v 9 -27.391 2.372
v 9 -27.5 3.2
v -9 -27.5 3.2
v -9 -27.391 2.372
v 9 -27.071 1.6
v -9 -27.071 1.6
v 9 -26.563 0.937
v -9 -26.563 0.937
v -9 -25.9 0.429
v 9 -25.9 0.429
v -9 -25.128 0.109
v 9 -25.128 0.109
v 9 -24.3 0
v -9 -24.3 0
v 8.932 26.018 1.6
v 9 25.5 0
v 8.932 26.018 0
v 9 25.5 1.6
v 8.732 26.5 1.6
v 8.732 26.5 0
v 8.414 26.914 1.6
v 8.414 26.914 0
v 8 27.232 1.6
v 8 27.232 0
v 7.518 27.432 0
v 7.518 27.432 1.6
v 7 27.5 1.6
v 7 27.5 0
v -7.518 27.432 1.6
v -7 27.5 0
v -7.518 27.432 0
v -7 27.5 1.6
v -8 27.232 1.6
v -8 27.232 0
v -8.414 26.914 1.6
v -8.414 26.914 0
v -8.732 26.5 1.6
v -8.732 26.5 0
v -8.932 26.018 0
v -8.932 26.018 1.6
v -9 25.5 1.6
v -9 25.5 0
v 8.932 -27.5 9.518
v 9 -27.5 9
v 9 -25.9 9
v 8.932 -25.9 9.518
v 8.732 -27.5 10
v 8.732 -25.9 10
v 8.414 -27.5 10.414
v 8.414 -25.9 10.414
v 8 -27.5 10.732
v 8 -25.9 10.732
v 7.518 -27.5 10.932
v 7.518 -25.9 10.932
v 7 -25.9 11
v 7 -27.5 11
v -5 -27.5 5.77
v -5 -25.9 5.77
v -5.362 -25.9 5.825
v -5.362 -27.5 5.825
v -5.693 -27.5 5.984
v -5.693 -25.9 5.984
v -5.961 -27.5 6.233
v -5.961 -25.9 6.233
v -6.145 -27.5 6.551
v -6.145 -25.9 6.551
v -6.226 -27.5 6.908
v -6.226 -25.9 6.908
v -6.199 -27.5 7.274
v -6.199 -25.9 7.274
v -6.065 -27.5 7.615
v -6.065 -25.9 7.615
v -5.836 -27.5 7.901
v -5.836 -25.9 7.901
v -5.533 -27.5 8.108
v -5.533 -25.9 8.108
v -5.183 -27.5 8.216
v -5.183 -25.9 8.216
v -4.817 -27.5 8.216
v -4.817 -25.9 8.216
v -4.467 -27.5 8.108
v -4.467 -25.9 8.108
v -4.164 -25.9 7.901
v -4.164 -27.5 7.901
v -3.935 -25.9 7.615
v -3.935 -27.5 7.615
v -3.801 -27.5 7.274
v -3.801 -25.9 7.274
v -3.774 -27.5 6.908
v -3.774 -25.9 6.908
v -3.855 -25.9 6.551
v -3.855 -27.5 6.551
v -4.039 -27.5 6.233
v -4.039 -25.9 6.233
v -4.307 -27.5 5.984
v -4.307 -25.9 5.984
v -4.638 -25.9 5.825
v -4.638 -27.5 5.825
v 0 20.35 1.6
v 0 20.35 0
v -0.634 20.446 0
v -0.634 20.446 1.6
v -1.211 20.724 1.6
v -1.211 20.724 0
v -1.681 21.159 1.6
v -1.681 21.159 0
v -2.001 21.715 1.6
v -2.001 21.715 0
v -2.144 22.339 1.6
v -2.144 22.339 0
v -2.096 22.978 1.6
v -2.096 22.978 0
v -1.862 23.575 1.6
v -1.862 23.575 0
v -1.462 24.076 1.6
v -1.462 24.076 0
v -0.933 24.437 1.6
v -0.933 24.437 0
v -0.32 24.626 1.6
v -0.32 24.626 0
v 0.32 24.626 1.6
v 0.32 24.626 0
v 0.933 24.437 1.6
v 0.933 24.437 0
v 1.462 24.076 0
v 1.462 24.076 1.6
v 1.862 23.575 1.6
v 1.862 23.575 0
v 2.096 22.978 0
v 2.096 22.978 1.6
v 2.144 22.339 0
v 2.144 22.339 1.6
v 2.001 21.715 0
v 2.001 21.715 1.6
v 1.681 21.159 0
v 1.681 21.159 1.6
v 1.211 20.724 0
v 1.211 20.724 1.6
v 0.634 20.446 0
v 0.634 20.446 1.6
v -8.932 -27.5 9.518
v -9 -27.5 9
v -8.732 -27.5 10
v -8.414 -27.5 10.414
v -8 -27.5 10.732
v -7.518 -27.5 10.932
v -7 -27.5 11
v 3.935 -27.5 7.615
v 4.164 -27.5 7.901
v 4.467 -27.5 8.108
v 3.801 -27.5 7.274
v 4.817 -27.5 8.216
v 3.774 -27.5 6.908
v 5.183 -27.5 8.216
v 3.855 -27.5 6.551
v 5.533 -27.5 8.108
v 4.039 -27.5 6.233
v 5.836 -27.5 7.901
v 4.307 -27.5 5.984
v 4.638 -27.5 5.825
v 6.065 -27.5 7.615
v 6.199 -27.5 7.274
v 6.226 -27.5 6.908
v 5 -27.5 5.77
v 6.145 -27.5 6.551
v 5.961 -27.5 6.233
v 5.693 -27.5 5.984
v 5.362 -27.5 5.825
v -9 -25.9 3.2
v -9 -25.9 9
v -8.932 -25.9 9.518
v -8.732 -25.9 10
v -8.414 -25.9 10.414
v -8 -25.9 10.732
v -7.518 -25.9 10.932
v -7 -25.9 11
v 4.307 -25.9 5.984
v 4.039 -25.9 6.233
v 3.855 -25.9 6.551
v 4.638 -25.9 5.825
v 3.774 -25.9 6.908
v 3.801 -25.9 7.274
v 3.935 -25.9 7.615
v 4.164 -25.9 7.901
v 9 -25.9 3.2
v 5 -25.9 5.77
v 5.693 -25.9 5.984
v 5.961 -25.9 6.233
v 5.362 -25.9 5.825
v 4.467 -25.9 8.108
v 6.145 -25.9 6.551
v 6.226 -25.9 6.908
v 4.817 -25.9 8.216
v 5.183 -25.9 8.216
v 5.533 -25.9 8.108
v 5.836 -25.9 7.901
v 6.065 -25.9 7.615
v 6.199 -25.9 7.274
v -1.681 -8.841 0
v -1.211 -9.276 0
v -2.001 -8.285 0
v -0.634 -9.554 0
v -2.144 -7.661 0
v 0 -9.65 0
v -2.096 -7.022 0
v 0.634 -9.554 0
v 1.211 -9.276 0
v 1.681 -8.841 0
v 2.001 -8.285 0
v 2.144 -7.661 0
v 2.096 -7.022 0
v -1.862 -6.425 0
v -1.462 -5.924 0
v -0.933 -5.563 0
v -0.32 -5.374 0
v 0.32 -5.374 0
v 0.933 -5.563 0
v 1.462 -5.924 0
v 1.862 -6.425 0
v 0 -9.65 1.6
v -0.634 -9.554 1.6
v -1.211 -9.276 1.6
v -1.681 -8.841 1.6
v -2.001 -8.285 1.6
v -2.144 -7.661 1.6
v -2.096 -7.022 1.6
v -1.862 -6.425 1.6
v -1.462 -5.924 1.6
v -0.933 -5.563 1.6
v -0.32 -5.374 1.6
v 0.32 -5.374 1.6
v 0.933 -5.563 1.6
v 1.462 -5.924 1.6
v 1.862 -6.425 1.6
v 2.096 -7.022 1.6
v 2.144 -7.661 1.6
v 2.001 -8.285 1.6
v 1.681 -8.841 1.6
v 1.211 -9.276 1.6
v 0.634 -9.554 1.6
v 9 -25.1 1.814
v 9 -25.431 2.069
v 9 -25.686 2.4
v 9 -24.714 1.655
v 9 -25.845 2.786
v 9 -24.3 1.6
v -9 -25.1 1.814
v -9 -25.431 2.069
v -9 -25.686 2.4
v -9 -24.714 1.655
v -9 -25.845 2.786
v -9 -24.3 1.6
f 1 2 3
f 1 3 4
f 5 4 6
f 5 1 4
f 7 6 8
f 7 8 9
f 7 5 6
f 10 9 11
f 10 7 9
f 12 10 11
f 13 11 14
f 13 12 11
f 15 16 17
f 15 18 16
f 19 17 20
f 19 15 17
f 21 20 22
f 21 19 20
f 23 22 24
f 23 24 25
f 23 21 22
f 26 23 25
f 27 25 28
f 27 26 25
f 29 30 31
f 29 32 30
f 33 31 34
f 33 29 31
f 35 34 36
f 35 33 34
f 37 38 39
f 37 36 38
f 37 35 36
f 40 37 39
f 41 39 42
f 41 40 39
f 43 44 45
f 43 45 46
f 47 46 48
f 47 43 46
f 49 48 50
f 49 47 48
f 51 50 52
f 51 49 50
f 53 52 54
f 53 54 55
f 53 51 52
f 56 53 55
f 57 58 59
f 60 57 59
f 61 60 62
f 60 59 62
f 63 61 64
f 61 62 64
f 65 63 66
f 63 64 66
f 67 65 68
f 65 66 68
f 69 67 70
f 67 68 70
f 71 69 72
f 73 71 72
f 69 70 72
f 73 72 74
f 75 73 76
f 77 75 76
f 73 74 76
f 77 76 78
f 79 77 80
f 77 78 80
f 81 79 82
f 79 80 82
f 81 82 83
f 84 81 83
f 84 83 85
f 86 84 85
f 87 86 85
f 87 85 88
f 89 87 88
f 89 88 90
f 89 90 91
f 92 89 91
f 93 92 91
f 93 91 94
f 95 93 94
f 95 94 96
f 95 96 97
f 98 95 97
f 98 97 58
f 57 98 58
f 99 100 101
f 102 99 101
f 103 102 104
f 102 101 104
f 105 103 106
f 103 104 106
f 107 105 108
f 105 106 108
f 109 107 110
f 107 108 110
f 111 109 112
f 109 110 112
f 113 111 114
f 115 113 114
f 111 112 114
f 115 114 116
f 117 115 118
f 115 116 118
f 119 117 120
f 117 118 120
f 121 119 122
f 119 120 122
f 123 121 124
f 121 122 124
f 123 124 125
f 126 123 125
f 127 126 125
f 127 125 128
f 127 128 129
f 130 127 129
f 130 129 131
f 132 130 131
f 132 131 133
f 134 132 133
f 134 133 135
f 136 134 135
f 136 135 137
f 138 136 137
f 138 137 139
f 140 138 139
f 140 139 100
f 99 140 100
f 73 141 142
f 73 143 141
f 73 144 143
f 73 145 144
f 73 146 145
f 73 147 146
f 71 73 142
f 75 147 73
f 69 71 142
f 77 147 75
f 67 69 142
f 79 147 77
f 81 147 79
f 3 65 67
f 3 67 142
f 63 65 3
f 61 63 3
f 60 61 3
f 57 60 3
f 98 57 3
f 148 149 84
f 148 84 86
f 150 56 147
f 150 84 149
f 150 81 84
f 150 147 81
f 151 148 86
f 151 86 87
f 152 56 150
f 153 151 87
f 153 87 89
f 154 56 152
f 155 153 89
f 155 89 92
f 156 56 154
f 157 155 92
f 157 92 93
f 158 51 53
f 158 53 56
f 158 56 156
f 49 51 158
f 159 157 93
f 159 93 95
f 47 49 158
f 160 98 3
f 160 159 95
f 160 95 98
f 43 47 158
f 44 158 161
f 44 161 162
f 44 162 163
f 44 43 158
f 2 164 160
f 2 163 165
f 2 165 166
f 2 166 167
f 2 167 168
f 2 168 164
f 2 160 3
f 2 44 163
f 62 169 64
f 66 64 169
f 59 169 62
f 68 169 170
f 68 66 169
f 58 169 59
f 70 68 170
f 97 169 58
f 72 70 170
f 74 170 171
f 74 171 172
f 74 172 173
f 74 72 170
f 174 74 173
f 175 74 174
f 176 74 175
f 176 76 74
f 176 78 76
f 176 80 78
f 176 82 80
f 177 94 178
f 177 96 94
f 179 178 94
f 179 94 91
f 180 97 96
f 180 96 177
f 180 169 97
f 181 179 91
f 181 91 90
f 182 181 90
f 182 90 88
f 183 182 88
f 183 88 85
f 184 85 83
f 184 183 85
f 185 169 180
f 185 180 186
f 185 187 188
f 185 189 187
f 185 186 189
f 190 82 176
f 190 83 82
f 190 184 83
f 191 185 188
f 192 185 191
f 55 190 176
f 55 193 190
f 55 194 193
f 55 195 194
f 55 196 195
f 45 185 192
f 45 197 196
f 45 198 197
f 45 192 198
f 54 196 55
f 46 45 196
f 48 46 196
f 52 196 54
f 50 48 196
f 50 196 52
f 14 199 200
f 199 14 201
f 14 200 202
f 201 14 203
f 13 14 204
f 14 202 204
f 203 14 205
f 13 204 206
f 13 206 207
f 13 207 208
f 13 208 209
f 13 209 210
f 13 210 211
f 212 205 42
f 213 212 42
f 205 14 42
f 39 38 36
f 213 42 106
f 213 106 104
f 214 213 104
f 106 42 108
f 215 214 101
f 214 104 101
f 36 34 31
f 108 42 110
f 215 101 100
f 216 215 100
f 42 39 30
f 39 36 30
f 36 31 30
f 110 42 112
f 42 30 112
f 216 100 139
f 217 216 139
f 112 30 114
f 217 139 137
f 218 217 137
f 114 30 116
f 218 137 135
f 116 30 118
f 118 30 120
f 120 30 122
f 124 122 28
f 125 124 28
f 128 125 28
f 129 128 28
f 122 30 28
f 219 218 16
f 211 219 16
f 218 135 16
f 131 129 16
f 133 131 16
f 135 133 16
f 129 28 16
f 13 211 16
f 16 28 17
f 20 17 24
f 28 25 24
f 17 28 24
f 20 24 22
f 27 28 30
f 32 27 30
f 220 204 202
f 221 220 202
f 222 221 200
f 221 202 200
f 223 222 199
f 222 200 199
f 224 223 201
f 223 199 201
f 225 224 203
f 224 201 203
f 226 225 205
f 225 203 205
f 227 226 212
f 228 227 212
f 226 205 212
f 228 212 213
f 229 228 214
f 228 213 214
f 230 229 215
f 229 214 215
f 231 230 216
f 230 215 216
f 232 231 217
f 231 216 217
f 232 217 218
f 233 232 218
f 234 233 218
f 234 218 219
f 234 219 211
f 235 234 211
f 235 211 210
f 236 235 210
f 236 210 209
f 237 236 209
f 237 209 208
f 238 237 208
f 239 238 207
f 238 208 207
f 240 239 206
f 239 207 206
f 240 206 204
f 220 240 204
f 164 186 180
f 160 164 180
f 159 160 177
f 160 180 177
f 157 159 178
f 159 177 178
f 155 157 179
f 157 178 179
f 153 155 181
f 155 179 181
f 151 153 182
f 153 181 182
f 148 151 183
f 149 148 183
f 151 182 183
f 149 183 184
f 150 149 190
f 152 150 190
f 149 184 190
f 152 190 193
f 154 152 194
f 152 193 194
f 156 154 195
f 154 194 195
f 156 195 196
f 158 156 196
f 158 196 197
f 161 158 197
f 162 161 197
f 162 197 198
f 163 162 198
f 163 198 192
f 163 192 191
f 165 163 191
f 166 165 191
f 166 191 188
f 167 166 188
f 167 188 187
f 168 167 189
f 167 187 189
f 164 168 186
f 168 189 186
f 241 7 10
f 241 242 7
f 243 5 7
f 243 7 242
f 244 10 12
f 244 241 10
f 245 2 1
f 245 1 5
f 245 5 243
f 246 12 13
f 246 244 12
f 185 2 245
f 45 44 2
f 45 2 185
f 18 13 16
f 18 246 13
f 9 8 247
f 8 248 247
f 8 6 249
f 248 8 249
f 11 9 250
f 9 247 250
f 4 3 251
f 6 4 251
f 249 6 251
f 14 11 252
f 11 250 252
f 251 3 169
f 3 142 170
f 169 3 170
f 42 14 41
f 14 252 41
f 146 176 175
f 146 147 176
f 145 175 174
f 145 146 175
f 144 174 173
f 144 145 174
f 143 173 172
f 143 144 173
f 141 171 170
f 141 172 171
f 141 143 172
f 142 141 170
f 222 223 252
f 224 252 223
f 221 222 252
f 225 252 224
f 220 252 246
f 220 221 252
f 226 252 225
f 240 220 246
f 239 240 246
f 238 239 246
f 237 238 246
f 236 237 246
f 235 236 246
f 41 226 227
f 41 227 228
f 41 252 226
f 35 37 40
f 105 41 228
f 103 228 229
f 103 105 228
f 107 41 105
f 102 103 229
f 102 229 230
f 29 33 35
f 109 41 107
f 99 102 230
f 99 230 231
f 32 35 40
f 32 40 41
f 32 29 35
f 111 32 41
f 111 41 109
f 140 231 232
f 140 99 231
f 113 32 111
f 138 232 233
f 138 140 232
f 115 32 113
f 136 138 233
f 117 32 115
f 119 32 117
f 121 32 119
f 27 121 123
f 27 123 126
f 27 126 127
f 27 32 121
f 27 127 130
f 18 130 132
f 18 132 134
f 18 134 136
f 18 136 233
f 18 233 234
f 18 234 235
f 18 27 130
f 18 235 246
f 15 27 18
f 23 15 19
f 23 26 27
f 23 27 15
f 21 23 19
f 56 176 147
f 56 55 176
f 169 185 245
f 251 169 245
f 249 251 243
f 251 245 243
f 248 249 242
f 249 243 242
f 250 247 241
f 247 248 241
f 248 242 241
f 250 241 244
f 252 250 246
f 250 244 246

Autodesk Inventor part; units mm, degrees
ref_plane "YZ Plane" through (0, 0, 0) normal (1, 0, 0) x (0, 1, 0)
ref_plane "XZ Plane" through (0, 0, 0) normal (0, 1, 0) x (-1, 0, 0)
ref_plane "XY Plane" through (0, 0, 0) normal (0, 0, 1) x (1, 0, 0)
sketch "スケッチ1" plane through (0, 0, 0) normal (0, 0, 1) x (1, 0, 0)
  line L0 (-9, -27.5) -> (9, -27.5)
  line L1 (9, -27.5) -> (9, 27.5)
  line L2 (9, 27.5) -> (-9, 27.5)
  line L3 (-9, 27.5) -> (-9, -27.5)
  line L4 (-9, -27.5) -> (9, 27.5) construction
  line L5 (9, -27.5) -> (-9, 27.5) construction
  point P0 (0, 0)
  dimension "d0" = 18
  dimension "d1" = 55
extrude "プレート1" add sketch "スケッチ1" along normal blind 1.6
sketch "スケッチ2" plane through (9, -25.9, 0) normal (0, -1, 0) x (1, 0, 0)
  line L0 (-18, 0) -> (0, 0)
  line L1 (0, 0) -> (0, 11)
  line L2 (0, 11) -> (-18, 11)
  line L3 (-18, 11) -> (-18, 0)
edge flange "フランジ1" height 11 angle 90 thickness 1.6 bend radius 1.6 thickness toward (0, -1, 0) relief tear relief width 1.6 relief depth 0.8 edges at (0, -27.5, 1.6) wall of the first edge with corners at (-9, -25.9, 0) (9, -25.9, 0) (9, -25.9, 11) (-9, -25.9, 11)
bend "曲げ1"
corner "コーナー1"
sketch "スケッチ3" plane through (0, 0, 1.6) normal (0, 0, 1) x (1, 0, 0)
  line L0 (-9, 27.5) -> (9, 27.5) projected
  point P0 (0, 0)
  point P1 (0, 22.5)
  point P2 (0, -7.5)
  dimension "d13" = 5
  dimension "d14" = 30
hole "穴1" at (0, 22.5, 1.6) at (0, -7.5, 1.6) direction (0, 0, -1) diameter 4.3 end through all clearance for "Flat Head Machine Screw" size "M4" standard "Ansi Metric M Profile"
sketch "スケッチ4" plane through (-9, -27.5, 11) normal (0, -1, 0) x (1, 0, 0)
  line L0 (0, 0) -> (18, 0) projected
  line L1 (18, 0) -> (18, -7.8) projected
  line L2 (0, -7.8) -> (0, 0) projected
  point P0 (9, -11)
  point P1 (14, -4)
  point P2 (4, -4)
  dimension "d22" = 4
  dimension "d40" = 4
  dimension "d41" = 4
hole "穴2" at (5, -27.5, 7) at (-5, -27.5, 7) direction (0, 1, 0) diameter 2.459 end through all thread size "M3x0.5" class "6H" standard "ANSI Metric M Profile"
fillet "コーナーR1" radius 2 3 edges at (9, -26.7, 11) (-9, 27.5, 0.8) (9, 27.5, 0.8)
fillet "コーナーR2" radius 2 1 edges at (-9, -26.7, 11)
equation "\"d20\" = Thickness"
equation "\"d30\" = Thickness"
equation "\"d2\" = Thickness"
equation "\"d3\" = BendReliefWidth"
equation "\"d4\" = BendReliefDepth"
equation "\"d5\" = MinimumRemnant"
equation "\"d6\" = TransitionRadius"
equation "\"d9\" = BendRadius"
equation "\"d10\" = CornerReliefSize"
equation "\"d11\" = GapSize"
equation "\"d12\" = JacobiRadiusSize"
equation "\"BendRadius\" = Thickness"
equation "\"BendReliefWidth\" = Thickness"
equation "\"BendReliefDepth\" = 0.5 * Thickness"
equation "\"CornerReliefSize\" = 4 * Thickness"
equation "\"MinimumRemnant\" = 2 * Thickness"
equation "\"TransitionRadius\" = BendRadius"
equation "\"JacobiRadiusSize\" = BendRadius"
equation "\"GapSize\" = Thickness"
equation "\"Thickness\" = 1.6"
properties part number "steel_plate7" material "鋼、炭素鋼"
